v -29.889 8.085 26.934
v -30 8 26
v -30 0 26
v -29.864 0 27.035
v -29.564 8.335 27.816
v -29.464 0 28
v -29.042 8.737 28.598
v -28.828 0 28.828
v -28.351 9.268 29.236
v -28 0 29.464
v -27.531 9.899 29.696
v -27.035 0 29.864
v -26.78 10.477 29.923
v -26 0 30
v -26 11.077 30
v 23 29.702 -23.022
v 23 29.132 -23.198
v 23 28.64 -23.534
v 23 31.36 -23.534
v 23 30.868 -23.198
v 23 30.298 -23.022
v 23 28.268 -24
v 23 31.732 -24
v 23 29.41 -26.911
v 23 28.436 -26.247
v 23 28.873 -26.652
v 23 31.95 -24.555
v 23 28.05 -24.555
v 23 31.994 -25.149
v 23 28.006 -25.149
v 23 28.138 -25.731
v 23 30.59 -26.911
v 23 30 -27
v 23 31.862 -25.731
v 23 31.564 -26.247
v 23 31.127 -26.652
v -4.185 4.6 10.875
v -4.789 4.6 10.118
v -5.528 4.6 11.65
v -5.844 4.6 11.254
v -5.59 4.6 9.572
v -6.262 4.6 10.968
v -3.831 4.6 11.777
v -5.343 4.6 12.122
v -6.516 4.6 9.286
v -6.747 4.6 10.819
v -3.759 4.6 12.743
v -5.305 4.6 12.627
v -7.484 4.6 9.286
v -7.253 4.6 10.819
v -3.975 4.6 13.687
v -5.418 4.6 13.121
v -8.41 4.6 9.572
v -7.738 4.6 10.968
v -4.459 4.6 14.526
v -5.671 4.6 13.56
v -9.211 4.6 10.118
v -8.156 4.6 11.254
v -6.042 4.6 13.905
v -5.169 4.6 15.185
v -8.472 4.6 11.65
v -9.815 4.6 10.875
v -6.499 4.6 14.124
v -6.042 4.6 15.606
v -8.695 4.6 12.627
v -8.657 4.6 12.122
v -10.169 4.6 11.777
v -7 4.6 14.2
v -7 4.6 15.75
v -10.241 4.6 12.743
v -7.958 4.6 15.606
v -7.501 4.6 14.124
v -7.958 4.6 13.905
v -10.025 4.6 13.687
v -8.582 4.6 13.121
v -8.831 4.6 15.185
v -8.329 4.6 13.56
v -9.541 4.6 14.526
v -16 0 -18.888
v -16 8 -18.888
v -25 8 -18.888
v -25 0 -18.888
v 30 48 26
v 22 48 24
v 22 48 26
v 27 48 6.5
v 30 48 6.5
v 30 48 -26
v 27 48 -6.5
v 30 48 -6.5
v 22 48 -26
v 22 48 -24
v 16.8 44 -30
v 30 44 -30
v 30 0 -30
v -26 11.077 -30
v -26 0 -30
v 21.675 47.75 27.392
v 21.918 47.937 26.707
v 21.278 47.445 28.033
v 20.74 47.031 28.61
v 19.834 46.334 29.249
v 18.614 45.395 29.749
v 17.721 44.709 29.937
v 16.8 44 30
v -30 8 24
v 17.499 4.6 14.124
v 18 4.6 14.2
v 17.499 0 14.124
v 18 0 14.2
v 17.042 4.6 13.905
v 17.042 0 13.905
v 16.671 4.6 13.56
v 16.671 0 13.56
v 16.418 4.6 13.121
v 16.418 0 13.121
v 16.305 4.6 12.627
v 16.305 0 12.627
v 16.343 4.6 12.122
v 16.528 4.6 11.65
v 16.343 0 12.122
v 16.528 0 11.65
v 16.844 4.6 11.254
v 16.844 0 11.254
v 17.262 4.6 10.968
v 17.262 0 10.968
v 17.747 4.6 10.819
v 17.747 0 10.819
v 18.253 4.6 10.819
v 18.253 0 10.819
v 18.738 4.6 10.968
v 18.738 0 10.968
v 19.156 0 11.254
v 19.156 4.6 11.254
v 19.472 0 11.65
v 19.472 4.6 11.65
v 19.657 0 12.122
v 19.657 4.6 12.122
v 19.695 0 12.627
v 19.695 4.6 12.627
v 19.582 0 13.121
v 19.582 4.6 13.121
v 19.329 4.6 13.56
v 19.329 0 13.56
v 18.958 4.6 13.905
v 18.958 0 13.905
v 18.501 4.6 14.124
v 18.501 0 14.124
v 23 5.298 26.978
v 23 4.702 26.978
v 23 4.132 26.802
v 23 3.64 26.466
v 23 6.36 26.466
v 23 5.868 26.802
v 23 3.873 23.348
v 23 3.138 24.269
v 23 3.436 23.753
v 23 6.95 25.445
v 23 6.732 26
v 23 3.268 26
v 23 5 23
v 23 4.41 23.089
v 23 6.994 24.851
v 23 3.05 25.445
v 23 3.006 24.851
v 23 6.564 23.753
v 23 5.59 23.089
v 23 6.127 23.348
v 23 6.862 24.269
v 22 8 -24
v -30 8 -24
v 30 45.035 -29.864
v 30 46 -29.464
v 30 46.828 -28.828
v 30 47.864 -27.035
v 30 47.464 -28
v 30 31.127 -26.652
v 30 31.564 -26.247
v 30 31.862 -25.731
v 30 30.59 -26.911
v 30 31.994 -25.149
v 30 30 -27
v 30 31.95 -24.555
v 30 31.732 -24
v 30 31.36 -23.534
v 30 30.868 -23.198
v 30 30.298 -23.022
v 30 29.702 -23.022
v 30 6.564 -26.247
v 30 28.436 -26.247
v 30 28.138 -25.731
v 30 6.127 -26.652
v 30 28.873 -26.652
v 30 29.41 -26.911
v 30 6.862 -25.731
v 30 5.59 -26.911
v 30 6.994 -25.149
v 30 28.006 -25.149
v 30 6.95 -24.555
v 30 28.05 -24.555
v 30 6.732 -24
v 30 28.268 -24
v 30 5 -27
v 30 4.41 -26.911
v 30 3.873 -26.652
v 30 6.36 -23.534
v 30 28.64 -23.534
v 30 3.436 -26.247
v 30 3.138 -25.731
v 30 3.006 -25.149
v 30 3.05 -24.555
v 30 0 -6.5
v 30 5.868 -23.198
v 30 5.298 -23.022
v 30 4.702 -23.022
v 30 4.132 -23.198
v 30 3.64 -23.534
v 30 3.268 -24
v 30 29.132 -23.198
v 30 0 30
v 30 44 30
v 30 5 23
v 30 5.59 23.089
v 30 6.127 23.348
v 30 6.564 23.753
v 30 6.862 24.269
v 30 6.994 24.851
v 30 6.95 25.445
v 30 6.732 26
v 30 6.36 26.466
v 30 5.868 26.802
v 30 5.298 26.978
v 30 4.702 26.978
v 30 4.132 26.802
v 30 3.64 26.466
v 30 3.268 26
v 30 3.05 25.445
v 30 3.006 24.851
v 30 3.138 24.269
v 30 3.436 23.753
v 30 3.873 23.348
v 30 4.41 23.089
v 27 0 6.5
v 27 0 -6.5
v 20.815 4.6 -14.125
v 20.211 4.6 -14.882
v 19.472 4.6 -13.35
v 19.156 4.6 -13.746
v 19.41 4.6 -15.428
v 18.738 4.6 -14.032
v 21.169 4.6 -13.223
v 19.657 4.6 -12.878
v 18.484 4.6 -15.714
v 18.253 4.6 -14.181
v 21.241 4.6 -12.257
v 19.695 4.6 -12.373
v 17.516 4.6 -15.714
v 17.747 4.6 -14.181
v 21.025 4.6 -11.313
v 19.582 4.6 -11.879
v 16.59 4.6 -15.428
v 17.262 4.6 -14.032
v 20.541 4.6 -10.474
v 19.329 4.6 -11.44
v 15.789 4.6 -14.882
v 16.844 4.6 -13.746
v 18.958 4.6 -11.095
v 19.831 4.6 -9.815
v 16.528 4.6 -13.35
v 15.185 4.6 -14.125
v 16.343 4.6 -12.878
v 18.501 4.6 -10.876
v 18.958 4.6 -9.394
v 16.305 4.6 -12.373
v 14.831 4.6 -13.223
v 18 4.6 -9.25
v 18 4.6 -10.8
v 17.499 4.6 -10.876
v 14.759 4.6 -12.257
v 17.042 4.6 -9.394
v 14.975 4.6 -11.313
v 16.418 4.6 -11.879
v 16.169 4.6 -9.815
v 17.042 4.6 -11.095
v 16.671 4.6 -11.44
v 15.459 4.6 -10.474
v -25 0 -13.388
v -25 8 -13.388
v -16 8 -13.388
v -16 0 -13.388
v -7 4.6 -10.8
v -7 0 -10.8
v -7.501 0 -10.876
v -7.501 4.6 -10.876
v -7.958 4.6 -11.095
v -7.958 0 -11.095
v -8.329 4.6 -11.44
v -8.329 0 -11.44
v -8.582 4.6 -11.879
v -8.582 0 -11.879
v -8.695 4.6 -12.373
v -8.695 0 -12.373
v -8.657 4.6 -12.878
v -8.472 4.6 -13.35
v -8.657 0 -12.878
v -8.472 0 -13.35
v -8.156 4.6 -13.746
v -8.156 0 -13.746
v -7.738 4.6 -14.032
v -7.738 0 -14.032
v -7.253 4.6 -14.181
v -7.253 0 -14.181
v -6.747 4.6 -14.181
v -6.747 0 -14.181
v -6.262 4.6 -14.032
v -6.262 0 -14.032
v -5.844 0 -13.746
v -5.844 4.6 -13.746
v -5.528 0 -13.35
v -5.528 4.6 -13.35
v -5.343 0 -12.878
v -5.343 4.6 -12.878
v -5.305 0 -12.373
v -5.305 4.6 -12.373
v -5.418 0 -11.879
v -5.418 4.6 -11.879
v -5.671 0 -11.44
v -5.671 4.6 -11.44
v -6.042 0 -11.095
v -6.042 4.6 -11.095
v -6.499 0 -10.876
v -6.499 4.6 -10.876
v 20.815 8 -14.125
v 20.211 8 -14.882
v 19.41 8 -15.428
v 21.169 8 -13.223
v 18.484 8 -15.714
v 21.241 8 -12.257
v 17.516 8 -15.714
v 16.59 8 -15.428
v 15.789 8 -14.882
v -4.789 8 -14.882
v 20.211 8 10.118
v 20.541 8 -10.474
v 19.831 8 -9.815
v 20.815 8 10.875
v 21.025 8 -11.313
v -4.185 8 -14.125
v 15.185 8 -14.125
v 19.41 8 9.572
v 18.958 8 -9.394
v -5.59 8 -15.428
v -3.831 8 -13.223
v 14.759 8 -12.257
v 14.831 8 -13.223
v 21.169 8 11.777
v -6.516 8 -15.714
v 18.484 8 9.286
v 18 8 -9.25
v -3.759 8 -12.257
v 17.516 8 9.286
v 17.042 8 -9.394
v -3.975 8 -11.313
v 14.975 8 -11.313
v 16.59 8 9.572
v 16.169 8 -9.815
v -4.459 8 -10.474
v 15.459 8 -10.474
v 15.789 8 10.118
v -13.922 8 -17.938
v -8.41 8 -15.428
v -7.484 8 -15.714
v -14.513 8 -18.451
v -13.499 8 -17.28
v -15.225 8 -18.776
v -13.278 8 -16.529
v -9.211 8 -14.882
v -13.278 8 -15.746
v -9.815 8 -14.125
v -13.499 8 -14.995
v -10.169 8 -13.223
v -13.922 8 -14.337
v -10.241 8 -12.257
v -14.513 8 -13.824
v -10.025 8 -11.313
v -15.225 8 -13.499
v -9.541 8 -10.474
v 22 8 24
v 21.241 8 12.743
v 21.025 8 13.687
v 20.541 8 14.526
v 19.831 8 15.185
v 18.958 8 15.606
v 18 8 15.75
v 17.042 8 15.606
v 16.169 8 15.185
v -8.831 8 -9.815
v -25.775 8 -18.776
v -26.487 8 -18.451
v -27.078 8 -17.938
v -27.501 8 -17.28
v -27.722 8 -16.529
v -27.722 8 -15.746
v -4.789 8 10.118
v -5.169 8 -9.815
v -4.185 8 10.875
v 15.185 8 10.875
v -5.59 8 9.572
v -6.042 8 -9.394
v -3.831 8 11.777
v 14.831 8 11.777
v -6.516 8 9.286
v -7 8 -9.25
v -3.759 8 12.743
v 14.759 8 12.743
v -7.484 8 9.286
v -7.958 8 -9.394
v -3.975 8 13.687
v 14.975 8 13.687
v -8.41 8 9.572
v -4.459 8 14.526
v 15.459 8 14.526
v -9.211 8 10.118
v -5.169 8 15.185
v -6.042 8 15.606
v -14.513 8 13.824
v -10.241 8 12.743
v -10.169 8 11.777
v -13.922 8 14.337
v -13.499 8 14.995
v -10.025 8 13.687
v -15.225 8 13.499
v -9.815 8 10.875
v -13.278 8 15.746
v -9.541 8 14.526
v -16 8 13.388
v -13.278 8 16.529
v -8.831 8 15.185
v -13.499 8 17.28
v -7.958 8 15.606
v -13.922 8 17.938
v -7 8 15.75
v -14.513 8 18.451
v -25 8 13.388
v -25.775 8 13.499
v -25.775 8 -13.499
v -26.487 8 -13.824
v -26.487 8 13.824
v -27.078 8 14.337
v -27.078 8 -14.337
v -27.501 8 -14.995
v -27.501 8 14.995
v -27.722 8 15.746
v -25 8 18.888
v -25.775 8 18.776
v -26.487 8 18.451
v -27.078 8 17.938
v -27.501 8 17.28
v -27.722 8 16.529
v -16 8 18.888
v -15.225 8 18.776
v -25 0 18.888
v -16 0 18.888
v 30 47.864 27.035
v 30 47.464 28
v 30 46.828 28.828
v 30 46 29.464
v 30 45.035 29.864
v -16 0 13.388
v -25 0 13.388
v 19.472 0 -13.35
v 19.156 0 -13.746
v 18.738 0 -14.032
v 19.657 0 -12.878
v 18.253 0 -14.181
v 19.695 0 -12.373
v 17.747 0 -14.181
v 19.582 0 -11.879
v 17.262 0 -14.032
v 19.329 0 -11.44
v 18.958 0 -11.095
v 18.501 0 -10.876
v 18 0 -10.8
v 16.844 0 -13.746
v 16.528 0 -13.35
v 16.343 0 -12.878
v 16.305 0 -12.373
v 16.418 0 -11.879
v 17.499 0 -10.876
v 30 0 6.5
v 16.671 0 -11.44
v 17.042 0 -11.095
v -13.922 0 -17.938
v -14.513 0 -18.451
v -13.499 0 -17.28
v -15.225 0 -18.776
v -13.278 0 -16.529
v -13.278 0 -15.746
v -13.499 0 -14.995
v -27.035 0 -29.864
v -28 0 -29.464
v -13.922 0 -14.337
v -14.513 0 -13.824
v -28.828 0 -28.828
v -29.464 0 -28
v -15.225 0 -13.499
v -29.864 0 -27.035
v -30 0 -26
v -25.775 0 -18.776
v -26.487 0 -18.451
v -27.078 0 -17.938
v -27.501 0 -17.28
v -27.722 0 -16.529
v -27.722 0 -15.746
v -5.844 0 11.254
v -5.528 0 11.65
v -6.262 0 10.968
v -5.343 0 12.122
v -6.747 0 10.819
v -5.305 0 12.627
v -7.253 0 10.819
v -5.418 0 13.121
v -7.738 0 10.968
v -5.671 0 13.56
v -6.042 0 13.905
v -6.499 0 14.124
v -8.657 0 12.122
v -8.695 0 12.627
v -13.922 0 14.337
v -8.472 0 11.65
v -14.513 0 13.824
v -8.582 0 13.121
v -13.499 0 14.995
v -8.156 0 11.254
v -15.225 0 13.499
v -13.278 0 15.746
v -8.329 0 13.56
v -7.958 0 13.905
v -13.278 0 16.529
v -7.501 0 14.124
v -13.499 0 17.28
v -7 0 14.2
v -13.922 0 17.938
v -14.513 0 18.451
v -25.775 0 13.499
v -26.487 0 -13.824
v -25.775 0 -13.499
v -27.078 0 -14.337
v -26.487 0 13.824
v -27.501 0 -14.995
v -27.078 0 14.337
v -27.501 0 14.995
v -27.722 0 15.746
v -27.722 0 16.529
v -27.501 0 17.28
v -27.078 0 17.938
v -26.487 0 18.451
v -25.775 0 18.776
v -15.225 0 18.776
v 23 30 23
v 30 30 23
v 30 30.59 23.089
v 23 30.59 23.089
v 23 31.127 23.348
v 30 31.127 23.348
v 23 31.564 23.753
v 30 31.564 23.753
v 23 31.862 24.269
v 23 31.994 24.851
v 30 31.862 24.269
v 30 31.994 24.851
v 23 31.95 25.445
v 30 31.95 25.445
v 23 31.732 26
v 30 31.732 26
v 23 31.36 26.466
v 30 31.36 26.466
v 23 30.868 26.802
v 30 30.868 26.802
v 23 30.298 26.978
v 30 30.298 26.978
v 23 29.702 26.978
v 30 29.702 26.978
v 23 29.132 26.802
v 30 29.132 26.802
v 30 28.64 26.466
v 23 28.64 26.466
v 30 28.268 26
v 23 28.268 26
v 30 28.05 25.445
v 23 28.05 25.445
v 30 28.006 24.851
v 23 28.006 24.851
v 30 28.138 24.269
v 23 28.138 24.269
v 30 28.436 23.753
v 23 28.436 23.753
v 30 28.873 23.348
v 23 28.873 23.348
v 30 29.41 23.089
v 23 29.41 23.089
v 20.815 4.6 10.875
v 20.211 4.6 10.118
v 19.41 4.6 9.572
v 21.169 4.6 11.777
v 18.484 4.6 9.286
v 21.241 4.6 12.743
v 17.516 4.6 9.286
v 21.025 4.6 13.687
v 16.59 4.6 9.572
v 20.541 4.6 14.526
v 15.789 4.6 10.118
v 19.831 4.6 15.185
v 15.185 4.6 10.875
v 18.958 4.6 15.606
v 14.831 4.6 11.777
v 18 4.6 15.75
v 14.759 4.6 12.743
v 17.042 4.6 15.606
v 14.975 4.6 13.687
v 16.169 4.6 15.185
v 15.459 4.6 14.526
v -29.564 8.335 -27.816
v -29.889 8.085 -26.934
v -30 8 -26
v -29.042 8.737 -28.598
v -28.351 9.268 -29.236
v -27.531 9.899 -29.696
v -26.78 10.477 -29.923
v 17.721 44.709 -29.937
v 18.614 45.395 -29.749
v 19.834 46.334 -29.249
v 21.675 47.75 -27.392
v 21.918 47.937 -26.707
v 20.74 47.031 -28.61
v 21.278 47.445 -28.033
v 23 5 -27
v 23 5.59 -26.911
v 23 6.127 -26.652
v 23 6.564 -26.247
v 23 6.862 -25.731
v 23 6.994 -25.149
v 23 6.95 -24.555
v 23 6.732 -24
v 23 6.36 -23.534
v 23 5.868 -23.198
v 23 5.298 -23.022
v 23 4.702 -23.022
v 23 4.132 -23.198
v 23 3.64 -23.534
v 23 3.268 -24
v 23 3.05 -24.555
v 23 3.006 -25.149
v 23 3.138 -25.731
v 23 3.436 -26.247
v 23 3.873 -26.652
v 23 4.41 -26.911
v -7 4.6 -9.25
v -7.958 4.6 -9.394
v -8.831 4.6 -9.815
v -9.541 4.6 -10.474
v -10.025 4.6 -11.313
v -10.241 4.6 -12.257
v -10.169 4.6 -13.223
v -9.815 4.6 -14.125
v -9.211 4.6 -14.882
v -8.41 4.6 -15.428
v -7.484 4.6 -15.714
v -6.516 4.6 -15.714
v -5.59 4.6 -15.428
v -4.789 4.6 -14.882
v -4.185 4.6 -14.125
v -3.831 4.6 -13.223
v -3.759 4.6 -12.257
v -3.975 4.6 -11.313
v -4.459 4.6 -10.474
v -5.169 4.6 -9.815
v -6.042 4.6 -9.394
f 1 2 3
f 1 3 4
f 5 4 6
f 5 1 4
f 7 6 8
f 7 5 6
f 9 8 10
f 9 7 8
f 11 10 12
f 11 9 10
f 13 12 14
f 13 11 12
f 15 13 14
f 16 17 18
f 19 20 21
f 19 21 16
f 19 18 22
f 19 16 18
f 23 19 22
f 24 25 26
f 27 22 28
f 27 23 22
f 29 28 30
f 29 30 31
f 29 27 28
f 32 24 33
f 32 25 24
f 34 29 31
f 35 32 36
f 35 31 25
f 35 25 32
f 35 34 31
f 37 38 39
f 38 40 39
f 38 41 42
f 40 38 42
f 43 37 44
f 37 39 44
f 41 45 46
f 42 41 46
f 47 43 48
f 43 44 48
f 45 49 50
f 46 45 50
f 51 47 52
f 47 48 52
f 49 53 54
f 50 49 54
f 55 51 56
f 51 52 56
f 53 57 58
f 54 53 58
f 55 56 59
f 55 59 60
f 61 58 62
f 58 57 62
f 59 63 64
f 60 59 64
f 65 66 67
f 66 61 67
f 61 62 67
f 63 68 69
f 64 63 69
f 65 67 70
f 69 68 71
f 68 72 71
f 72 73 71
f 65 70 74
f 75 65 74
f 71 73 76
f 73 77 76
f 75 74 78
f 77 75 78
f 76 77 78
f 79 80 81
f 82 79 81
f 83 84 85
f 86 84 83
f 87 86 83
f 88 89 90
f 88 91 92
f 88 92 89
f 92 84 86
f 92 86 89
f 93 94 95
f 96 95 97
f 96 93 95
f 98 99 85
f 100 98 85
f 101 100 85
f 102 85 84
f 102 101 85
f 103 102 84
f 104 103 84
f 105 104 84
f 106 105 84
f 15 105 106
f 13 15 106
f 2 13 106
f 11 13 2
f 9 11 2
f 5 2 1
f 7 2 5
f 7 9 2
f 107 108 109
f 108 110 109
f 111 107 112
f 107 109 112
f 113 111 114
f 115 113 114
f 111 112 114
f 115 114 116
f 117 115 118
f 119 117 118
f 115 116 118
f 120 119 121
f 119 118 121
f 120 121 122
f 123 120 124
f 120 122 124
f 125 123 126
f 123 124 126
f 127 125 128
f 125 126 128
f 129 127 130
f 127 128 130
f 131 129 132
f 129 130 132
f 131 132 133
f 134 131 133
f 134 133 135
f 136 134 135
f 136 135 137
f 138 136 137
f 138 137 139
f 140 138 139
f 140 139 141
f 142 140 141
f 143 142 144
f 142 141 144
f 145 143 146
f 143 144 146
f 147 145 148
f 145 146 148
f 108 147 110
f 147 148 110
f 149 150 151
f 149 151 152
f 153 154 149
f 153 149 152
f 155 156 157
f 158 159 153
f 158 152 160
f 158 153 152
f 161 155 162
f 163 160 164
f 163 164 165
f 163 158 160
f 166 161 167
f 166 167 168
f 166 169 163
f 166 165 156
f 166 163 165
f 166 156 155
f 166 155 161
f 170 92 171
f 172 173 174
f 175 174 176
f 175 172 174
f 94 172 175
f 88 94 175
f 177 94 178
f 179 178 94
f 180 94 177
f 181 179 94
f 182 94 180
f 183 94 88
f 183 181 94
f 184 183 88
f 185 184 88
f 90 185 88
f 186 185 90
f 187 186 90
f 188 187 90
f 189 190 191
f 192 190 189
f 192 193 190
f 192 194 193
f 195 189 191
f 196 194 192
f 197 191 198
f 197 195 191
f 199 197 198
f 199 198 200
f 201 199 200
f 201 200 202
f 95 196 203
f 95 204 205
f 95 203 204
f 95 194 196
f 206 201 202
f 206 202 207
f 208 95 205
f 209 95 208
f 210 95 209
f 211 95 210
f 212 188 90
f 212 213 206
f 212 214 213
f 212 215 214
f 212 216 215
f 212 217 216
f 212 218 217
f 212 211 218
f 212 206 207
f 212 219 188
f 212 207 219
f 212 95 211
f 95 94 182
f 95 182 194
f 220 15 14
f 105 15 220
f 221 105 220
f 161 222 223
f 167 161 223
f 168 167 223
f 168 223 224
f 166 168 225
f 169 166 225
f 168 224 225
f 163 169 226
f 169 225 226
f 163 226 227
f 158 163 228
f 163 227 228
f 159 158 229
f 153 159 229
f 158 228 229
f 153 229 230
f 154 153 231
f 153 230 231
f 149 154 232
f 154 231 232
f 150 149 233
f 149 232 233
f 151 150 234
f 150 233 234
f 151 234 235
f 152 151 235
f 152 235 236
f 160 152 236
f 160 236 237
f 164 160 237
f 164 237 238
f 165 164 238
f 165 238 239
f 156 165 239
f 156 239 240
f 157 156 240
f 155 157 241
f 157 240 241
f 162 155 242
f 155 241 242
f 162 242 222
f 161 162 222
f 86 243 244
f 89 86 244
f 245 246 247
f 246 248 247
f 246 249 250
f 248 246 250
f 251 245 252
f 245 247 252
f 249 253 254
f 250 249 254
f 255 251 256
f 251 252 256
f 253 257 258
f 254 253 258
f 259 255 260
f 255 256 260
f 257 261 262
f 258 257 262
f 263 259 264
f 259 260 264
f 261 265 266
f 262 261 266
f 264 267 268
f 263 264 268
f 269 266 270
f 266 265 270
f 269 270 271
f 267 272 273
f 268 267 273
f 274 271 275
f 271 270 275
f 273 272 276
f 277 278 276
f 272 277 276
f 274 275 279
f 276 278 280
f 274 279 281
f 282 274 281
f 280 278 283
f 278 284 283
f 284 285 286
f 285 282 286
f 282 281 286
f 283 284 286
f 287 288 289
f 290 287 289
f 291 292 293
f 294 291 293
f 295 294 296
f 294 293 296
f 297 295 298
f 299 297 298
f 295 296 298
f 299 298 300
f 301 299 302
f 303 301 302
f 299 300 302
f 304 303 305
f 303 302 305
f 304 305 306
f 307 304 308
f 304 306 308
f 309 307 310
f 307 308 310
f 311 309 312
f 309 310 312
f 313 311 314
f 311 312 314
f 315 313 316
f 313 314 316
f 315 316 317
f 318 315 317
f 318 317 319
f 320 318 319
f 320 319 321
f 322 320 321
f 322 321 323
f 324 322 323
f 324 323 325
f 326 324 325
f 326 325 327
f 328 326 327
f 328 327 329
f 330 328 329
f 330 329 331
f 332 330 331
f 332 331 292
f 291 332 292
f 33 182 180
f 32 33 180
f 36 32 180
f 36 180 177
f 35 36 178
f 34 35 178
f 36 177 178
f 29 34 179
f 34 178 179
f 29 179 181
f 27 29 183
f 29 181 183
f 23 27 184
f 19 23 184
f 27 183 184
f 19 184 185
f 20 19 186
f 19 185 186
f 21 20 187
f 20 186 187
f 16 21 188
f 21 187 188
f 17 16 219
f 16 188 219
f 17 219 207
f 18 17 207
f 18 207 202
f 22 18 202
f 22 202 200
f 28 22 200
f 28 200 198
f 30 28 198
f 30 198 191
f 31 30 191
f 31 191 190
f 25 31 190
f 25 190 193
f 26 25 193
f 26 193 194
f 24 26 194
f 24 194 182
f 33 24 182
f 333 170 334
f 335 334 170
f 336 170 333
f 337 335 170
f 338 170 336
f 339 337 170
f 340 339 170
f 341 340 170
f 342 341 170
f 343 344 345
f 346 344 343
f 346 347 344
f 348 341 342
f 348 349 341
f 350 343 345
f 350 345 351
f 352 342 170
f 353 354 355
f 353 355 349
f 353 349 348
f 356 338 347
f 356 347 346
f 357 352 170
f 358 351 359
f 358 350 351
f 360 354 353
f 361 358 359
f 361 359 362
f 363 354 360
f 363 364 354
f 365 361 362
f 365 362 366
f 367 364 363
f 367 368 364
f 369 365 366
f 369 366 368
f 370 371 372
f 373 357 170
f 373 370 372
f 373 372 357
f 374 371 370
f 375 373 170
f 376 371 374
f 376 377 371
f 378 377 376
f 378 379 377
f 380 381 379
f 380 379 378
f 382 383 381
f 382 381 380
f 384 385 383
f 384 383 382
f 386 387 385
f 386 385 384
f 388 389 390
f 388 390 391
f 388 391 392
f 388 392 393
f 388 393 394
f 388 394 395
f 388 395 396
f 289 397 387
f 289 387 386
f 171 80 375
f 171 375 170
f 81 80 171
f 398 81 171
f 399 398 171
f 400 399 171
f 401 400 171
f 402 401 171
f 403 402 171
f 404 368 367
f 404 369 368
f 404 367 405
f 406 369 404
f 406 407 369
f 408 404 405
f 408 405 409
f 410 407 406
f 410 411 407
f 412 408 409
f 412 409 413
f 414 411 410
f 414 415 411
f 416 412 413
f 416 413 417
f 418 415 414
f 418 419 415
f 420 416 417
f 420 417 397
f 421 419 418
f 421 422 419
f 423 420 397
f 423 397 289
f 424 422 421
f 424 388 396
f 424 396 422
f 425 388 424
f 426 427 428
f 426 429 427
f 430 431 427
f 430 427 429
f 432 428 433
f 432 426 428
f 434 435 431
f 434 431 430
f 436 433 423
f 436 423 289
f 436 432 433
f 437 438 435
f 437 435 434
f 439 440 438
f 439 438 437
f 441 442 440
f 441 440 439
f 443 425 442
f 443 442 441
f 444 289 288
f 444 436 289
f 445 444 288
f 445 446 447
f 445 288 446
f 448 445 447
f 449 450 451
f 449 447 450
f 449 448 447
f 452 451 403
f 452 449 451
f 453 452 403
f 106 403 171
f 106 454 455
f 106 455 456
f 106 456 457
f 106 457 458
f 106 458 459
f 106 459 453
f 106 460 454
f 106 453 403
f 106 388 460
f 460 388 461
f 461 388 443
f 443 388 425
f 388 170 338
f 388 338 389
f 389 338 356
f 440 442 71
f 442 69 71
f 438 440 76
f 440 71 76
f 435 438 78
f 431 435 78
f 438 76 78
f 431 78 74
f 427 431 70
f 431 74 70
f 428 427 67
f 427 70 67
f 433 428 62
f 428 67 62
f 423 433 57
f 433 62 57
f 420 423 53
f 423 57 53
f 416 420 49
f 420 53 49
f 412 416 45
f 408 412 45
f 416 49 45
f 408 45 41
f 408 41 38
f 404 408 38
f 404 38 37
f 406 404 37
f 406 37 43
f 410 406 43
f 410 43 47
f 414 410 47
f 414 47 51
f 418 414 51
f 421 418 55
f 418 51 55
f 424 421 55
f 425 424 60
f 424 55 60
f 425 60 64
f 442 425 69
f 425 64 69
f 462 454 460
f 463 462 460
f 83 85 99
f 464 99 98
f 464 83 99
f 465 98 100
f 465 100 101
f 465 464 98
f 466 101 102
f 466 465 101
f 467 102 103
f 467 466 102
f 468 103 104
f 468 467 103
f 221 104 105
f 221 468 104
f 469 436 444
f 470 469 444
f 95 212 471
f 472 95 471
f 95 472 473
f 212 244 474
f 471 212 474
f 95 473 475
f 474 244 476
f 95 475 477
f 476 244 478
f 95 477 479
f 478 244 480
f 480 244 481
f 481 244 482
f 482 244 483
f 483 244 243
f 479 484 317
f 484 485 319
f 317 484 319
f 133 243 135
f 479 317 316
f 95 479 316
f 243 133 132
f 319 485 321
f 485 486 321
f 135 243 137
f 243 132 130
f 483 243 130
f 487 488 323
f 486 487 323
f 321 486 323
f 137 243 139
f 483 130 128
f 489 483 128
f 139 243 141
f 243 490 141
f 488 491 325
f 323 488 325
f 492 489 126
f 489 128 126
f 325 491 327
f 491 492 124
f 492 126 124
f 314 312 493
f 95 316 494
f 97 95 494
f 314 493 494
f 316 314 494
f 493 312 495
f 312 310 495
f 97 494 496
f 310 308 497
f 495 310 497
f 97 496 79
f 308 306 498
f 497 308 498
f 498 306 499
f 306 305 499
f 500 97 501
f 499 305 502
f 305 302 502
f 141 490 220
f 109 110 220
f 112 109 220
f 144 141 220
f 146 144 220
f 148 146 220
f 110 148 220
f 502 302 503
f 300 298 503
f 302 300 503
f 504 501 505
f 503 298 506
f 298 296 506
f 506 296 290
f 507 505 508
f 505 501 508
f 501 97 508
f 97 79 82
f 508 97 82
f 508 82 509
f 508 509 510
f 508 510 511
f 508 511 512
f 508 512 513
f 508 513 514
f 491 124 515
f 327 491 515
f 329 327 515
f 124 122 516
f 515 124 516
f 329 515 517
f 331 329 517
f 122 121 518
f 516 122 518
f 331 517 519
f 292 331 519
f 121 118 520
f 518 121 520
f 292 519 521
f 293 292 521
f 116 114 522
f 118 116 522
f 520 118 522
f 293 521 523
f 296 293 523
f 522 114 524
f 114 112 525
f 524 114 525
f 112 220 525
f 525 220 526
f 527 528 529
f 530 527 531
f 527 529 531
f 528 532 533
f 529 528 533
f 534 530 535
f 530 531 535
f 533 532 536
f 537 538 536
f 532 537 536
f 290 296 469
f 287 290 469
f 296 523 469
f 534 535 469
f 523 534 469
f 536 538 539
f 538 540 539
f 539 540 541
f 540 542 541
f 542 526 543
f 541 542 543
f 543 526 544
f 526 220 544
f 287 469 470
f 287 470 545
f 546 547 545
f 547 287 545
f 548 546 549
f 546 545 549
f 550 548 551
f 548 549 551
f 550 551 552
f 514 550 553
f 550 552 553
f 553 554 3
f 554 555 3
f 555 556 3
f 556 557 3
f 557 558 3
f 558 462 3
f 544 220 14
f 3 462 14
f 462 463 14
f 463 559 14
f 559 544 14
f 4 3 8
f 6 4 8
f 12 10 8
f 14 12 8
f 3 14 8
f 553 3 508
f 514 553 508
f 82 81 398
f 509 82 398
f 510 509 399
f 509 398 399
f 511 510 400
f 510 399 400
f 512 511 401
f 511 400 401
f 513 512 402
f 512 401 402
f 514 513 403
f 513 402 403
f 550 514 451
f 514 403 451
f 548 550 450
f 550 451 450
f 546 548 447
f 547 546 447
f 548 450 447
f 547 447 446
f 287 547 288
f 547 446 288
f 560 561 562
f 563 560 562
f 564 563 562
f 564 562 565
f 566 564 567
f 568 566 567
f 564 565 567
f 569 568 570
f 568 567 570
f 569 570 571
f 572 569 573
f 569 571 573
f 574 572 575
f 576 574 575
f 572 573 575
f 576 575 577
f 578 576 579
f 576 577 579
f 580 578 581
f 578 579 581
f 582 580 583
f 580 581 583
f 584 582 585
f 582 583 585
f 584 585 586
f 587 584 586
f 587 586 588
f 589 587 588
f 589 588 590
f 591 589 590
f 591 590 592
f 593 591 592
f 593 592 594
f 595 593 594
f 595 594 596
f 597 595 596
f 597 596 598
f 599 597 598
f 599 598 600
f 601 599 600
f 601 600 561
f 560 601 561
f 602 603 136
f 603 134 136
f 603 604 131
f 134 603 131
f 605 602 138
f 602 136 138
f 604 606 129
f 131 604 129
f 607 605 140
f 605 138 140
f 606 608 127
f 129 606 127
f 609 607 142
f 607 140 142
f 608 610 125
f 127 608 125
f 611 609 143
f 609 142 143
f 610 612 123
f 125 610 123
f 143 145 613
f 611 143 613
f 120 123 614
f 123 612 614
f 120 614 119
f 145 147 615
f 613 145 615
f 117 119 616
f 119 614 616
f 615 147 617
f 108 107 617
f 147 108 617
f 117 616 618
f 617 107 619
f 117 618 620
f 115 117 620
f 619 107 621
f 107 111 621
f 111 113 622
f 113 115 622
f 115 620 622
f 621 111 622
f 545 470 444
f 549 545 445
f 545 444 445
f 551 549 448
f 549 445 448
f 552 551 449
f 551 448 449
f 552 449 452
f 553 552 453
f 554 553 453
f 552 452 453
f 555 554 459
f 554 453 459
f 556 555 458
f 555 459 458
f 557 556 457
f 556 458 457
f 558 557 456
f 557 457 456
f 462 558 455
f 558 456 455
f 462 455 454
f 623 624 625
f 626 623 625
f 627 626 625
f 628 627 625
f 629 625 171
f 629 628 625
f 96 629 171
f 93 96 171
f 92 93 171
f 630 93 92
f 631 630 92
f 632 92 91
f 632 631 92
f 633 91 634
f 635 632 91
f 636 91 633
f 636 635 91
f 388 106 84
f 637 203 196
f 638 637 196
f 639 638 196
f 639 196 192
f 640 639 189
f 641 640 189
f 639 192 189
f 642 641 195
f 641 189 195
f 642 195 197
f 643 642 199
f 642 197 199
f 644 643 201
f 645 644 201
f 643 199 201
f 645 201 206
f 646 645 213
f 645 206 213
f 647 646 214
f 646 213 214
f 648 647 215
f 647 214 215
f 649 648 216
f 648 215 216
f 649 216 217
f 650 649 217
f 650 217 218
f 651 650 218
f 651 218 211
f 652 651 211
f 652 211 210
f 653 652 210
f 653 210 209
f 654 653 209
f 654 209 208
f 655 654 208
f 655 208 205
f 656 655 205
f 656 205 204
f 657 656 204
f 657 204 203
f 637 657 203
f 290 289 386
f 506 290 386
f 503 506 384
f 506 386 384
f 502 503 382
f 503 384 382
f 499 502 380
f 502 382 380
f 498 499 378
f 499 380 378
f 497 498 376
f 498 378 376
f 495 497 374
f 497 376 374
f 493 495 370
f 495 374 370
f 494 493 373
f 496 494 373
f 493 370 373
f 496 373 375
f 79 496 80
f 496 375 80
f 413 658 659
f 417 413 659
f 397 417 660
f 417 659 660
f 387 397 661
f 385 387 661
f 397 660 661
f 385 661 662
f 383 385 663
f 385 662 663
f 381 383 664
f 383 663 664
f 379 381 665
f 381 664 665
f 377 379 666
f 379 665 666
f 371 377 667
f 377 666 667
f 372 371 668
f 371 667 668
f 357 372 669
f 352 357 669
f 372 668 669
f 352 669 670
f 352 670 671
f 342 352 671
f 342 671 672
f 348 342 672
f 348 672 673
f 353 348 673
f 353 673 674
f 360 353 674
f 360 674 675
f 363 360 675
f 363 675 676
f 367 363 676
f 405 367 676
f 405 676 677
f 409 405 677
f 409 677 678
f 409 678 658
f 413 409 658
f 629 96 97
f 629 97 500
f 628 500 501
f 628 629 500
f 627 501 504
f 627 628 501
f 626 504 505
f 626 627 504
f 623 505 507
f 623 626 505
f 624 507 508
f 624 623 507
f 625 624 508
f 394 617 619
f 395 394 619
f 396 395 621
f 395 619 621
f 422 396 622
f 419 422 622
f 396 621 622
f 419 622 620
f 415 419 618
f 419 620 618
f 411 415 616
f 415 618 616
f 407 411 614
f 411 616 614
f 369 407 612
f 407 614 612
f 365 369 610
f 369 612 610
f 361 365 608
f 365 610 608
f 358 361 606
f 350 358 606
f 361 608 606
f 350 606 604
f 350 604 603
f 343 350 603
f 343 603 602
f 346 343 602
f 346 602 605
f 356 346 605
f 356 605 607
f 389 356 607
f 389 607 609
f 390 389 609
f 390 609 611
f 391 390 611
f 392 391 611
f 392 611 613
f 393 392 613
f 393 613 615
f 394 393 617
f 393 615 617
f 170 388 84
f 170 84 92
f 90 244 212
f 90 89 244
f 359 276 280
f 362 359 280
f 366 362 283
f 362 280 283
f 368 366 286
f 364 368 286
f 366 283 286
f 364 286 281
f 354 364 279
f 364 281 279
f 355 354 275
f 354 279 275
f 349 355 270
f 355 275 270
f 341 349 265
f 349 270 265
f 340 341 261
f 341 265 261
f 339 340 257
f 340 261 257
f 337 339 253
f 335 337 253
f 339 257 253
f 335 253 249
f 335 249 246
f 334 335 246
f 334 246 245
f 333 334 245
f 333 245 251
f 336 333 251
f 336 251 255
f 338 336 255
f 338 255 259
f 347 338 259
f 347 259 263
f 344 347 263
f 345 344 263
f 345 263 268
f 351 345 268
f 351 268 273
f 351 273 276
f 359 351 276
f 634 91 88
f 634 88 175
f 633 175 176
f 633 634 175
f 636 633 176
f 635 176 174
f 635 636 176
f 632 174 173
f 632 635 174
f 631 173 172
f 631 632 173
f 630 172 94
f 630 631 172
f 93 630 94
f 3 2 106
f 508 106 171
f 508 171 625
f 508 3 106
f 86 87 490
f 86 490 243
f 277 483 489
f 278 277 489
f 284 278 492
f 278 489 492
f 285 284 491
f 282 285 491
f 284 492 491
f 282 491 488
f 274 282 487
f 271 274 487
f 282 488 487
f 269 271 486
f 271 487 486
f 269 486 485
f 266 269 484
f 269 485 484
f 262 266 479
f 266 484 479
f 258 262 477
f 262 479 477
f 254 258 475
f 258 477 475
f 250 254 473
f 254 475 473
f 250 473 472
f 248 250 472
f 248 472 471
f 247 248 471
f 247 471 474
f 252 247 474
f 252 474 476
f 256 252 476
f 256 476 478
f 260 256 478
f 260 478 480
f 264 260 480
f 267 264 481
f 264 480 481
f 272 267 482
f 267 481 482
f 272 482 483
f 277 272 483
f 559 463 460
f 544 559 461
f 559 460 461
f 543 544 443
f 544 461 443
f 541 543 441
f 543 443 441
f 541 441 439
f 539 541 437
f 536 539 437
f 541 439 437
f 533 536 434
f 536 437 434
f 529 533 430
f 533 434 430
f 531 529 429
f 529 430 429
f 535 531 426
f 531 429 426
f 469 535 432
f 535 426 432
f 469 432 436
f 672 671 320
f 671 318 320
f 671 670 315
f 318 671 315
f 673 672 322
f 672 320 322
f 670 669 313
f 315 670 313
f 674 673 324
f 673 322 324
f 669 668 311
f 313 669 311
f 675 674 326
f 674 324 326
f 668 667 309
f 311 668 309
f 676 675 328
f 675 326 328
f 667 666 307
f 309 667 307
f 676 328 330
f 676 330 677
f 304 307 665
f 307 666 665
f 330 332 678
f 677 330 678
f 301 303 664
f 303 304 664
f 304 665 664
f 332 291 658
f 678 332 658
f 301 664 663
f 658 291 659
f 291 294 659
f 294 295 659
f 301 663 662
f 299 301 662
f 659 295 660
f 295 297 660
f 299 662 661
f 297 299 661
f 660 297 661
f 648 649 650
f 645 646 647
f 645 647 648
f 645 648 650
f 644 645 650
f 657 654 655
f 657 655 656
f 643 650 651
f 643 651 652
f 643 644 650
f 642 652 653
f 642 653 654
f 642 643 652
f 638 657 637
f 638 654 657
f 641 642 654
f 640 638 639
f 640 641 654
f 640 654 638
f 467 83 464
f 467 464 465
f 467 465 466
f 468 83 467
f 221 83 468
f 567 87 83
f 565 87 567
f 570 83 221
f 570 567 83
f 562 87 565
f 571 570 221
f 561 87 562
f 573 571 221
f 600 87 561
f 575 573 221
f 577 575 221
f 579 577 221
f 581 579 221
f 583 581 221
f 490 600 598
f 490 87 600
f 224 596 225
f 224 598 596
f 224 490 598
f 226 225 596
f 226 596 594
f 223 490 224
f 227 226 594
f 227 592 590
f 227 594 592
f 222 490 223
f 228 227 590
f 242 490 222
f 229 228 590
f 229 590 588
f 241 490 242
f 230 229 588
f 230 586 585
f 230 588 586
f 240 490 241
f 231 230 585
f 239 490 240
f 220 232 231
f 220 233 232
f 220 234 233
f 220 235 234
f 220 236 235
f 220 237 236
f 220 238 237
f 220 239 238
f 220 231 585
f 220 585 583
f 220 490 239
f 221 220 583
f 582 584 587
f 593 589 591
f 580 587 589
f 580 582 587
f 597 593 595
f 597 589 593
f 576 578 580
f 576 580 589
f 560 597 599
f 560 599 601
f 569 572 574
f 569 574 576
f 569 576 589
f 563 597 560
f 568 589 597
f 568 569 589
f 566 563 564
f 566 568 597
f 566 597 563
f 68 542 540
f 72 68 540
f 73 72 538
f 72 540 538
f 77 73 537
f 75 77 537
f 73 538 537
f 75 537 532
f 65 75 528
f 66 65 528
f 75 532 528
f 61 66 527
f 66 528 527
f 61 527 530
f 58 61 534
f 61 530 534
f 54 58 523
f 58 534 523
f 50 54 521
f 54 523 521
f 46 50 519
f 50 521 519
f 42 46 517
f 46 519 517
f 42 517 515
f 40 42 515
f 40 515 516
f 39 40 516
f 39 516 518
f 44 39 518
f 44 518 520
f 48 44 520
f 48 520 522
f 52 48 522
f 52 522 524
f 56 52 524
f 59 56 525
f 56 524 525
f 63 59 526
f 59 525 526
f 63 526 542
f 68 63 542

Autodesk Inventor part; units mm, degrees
ref_plane "YZ Plane" through (0, 0, 0) normal (1, 0, 0) x (0, 1, 0)
ref_plane "XZ Plane" through (0, 0, 0) normal (0, 1, 0) x (-1, 0, 0)
ref_plane "XY Plane" through (0, 0, 0) normal (0, 0, 1) x (1, 0, 0)
sketch "Skizze1" plane through (0, 0, 0) normal (0, 1, 0) x (-1, 0, 0)
  line L0 (-30, 30) -> (30, 30)
  line L1 (30, 30) -> (30, -30)
  line L2 (30, -30) -> (-30, -30)
  line L3 (-30, -30) -> (-30, 30)
  line L4 (-30, 30) -> (30, -30) construction
  line L5 (30, 30) -> (-30, -30) construction
  point P0 (0, 0)
  dimension "d0" = 60
  dimension "d1" = 60
extrude "Extrusion1" add sketch "Skizze1" along normal blind 8
sketch "Skizze2" plane through (0, 8, 0) normal (0, 1, 0) x (1, 0, 0)
  line L0 (-30, -30) -> (30, -30) projected
  line L1 (30, 30) -> (-30, 30) projected
  line L2 (30, -30) -> (22, -30)
  line L3 (22, -30) -> (22, 30)
  line L4 (22, 30) -> (30, 30)
  line L5 (30, 30) -> (30, -30)
  point P0 (0, 0)
  dimension "d4" = 8
extrude "Extrusion2" add sketch "Skizze2" along normal blind 40
sketch "Skizze3" plane through (0, 8, 0) normal (0, 1, 0) x (1, 0, 0)
  line L0 (42, 0) -> (-42, 0) projected
  line L1 (22, 30) -> (22, -30) projected
  point P0 (0, 0)
  point P1 (18, -12.5)
  point P2 (18, 12.5)
  point P3 (-7, 12.5)
  point P4 (-7, -12.5)
  dimension "d7" = 25
  dimension "d8" = 25
  dimension "d9" = 4
hole "Bohrung1" at (18, 8, 12.5) at (18, 8, -12.5) at (-7, 8, -12.5) at (-7, 8, 12.5) direction (0, -1, 0) diameter 3.4 end through all counterbore diameter 6.5 counterbore depth 3.4 clearance for "Inbusschraube ISO 4762" size "M3" standard "ISO"
sketch "Skizze4" plane through (30, 0, 30) normal (1, 0, 0) x (0, 0, -1)
  line L0 (30, -9.6) -> (30, 57.6) projected
  circle A0 centre (5, 5) radius 2
  circle A1 centre (55, 5) radius 2
  line L1 (0, 48) -> (60, 48) projected
  line L2 (0, 0) -> (60, 0) projected
  circle A2 centre (55, 30) radius 2
  circle A3 centre (5, 30) radius 2
  point P0 (30, 0)
  dimension "d17" = 4
  dimension "d18" = 50
  dimension "d22" = 5
  dimension "d25" = 25
extrude "Extrusion3" cut sketch "Skizze4" against normal blind 7
sketch "Skizze5" plane through (0, 0, 0) normal (0, 0, 1) x (1, 0, 0)
  line L0 (30, 48) -> (22, 48) projected
  line L1 (-30, 0) -> (-30, 8) projected
  line L2 (22, 48) -> (-30, 8)
  line L3 (-30, 8) -> (22, 8)
  line L4 (22, 8) -> (22, 48)
  point P0 (0, 0)
extrude "Extrusion4" add sketch "Skizze5" against normal blind 6 from surface at 30
mirror "Spiegeln1" about plane through (0, 0, 0) normal (0, 0, 1) of "Extrusion4"
sketch "Skizze6" plane through (0, 48, 0) normal (0, 1, 0) x (1, 0, 0)
  line L0 (33, -6.5) -> (27, -6.5)
  line L1 (27, -6.5) -> (27, 6.5)
  line L2 (27, 6.5) -> (33, 6.5)
  line L3 (33, 6.5) -> (33, -6.5)
  line L4 (30, -30) -> (30, 30) projected
  line L5 (33, -6.5) -> (27, 6.5) construction
  line L6 (27, -6.5) -> (33, 6.5) construction
  point P0 (0, 0)
  point P1 (30, 0)
  point P2 (30, -6.5)
  point P3 (30, 6.5)
  dimension "d26" = 3
  dimension "d27" = 13
extrude "Extrusion5" cut sketch "Skizze6" against normal through all contours L0 L1 L2 L4
sketch "Skizze7" plane through (0, 8, 0) normal (0, 1, 0) x (1, 0, 0)
  line L0 (-25, 16.1375) -> (-16, 16.1375) construction
  line L1 (-25, 13.3875) -> (-16, 13.3875)
  line L2 (-16, 18.8875) -> (-25, 18.8875)
  arc A0 (-25, 18.8875) -> (-25, 13.3875) centre (-25, 16.1375) ccw
  arc A1 (-16, 13.3875) -> (-16, 18.8875) centre (-16, 16.1375) ccw
  line L3 (-30, 24) -> (-30, -24) projected
  point P0 (0, 0)
  point P1 (-20.5, 16.1375)
  dimension "d30" = 5.5
  dimension "d31" = 9
  dimension "d32" = 9.5
extrude "Extrusion6" cut sketch "Skizze7" against normal through all
mirror "Spiegeln2" about plane through (0, 0, 0) normal (0, 0, 1) of "Extrusion6"
fillet "Rundung1" radius 4 4 edges at (26, 48, 30) (26, 48, -30) (-30, 4, 30) (-30, 4, -30)
properties part number "26_Laser_carriage_V2" material "PET-Kunststoff"
